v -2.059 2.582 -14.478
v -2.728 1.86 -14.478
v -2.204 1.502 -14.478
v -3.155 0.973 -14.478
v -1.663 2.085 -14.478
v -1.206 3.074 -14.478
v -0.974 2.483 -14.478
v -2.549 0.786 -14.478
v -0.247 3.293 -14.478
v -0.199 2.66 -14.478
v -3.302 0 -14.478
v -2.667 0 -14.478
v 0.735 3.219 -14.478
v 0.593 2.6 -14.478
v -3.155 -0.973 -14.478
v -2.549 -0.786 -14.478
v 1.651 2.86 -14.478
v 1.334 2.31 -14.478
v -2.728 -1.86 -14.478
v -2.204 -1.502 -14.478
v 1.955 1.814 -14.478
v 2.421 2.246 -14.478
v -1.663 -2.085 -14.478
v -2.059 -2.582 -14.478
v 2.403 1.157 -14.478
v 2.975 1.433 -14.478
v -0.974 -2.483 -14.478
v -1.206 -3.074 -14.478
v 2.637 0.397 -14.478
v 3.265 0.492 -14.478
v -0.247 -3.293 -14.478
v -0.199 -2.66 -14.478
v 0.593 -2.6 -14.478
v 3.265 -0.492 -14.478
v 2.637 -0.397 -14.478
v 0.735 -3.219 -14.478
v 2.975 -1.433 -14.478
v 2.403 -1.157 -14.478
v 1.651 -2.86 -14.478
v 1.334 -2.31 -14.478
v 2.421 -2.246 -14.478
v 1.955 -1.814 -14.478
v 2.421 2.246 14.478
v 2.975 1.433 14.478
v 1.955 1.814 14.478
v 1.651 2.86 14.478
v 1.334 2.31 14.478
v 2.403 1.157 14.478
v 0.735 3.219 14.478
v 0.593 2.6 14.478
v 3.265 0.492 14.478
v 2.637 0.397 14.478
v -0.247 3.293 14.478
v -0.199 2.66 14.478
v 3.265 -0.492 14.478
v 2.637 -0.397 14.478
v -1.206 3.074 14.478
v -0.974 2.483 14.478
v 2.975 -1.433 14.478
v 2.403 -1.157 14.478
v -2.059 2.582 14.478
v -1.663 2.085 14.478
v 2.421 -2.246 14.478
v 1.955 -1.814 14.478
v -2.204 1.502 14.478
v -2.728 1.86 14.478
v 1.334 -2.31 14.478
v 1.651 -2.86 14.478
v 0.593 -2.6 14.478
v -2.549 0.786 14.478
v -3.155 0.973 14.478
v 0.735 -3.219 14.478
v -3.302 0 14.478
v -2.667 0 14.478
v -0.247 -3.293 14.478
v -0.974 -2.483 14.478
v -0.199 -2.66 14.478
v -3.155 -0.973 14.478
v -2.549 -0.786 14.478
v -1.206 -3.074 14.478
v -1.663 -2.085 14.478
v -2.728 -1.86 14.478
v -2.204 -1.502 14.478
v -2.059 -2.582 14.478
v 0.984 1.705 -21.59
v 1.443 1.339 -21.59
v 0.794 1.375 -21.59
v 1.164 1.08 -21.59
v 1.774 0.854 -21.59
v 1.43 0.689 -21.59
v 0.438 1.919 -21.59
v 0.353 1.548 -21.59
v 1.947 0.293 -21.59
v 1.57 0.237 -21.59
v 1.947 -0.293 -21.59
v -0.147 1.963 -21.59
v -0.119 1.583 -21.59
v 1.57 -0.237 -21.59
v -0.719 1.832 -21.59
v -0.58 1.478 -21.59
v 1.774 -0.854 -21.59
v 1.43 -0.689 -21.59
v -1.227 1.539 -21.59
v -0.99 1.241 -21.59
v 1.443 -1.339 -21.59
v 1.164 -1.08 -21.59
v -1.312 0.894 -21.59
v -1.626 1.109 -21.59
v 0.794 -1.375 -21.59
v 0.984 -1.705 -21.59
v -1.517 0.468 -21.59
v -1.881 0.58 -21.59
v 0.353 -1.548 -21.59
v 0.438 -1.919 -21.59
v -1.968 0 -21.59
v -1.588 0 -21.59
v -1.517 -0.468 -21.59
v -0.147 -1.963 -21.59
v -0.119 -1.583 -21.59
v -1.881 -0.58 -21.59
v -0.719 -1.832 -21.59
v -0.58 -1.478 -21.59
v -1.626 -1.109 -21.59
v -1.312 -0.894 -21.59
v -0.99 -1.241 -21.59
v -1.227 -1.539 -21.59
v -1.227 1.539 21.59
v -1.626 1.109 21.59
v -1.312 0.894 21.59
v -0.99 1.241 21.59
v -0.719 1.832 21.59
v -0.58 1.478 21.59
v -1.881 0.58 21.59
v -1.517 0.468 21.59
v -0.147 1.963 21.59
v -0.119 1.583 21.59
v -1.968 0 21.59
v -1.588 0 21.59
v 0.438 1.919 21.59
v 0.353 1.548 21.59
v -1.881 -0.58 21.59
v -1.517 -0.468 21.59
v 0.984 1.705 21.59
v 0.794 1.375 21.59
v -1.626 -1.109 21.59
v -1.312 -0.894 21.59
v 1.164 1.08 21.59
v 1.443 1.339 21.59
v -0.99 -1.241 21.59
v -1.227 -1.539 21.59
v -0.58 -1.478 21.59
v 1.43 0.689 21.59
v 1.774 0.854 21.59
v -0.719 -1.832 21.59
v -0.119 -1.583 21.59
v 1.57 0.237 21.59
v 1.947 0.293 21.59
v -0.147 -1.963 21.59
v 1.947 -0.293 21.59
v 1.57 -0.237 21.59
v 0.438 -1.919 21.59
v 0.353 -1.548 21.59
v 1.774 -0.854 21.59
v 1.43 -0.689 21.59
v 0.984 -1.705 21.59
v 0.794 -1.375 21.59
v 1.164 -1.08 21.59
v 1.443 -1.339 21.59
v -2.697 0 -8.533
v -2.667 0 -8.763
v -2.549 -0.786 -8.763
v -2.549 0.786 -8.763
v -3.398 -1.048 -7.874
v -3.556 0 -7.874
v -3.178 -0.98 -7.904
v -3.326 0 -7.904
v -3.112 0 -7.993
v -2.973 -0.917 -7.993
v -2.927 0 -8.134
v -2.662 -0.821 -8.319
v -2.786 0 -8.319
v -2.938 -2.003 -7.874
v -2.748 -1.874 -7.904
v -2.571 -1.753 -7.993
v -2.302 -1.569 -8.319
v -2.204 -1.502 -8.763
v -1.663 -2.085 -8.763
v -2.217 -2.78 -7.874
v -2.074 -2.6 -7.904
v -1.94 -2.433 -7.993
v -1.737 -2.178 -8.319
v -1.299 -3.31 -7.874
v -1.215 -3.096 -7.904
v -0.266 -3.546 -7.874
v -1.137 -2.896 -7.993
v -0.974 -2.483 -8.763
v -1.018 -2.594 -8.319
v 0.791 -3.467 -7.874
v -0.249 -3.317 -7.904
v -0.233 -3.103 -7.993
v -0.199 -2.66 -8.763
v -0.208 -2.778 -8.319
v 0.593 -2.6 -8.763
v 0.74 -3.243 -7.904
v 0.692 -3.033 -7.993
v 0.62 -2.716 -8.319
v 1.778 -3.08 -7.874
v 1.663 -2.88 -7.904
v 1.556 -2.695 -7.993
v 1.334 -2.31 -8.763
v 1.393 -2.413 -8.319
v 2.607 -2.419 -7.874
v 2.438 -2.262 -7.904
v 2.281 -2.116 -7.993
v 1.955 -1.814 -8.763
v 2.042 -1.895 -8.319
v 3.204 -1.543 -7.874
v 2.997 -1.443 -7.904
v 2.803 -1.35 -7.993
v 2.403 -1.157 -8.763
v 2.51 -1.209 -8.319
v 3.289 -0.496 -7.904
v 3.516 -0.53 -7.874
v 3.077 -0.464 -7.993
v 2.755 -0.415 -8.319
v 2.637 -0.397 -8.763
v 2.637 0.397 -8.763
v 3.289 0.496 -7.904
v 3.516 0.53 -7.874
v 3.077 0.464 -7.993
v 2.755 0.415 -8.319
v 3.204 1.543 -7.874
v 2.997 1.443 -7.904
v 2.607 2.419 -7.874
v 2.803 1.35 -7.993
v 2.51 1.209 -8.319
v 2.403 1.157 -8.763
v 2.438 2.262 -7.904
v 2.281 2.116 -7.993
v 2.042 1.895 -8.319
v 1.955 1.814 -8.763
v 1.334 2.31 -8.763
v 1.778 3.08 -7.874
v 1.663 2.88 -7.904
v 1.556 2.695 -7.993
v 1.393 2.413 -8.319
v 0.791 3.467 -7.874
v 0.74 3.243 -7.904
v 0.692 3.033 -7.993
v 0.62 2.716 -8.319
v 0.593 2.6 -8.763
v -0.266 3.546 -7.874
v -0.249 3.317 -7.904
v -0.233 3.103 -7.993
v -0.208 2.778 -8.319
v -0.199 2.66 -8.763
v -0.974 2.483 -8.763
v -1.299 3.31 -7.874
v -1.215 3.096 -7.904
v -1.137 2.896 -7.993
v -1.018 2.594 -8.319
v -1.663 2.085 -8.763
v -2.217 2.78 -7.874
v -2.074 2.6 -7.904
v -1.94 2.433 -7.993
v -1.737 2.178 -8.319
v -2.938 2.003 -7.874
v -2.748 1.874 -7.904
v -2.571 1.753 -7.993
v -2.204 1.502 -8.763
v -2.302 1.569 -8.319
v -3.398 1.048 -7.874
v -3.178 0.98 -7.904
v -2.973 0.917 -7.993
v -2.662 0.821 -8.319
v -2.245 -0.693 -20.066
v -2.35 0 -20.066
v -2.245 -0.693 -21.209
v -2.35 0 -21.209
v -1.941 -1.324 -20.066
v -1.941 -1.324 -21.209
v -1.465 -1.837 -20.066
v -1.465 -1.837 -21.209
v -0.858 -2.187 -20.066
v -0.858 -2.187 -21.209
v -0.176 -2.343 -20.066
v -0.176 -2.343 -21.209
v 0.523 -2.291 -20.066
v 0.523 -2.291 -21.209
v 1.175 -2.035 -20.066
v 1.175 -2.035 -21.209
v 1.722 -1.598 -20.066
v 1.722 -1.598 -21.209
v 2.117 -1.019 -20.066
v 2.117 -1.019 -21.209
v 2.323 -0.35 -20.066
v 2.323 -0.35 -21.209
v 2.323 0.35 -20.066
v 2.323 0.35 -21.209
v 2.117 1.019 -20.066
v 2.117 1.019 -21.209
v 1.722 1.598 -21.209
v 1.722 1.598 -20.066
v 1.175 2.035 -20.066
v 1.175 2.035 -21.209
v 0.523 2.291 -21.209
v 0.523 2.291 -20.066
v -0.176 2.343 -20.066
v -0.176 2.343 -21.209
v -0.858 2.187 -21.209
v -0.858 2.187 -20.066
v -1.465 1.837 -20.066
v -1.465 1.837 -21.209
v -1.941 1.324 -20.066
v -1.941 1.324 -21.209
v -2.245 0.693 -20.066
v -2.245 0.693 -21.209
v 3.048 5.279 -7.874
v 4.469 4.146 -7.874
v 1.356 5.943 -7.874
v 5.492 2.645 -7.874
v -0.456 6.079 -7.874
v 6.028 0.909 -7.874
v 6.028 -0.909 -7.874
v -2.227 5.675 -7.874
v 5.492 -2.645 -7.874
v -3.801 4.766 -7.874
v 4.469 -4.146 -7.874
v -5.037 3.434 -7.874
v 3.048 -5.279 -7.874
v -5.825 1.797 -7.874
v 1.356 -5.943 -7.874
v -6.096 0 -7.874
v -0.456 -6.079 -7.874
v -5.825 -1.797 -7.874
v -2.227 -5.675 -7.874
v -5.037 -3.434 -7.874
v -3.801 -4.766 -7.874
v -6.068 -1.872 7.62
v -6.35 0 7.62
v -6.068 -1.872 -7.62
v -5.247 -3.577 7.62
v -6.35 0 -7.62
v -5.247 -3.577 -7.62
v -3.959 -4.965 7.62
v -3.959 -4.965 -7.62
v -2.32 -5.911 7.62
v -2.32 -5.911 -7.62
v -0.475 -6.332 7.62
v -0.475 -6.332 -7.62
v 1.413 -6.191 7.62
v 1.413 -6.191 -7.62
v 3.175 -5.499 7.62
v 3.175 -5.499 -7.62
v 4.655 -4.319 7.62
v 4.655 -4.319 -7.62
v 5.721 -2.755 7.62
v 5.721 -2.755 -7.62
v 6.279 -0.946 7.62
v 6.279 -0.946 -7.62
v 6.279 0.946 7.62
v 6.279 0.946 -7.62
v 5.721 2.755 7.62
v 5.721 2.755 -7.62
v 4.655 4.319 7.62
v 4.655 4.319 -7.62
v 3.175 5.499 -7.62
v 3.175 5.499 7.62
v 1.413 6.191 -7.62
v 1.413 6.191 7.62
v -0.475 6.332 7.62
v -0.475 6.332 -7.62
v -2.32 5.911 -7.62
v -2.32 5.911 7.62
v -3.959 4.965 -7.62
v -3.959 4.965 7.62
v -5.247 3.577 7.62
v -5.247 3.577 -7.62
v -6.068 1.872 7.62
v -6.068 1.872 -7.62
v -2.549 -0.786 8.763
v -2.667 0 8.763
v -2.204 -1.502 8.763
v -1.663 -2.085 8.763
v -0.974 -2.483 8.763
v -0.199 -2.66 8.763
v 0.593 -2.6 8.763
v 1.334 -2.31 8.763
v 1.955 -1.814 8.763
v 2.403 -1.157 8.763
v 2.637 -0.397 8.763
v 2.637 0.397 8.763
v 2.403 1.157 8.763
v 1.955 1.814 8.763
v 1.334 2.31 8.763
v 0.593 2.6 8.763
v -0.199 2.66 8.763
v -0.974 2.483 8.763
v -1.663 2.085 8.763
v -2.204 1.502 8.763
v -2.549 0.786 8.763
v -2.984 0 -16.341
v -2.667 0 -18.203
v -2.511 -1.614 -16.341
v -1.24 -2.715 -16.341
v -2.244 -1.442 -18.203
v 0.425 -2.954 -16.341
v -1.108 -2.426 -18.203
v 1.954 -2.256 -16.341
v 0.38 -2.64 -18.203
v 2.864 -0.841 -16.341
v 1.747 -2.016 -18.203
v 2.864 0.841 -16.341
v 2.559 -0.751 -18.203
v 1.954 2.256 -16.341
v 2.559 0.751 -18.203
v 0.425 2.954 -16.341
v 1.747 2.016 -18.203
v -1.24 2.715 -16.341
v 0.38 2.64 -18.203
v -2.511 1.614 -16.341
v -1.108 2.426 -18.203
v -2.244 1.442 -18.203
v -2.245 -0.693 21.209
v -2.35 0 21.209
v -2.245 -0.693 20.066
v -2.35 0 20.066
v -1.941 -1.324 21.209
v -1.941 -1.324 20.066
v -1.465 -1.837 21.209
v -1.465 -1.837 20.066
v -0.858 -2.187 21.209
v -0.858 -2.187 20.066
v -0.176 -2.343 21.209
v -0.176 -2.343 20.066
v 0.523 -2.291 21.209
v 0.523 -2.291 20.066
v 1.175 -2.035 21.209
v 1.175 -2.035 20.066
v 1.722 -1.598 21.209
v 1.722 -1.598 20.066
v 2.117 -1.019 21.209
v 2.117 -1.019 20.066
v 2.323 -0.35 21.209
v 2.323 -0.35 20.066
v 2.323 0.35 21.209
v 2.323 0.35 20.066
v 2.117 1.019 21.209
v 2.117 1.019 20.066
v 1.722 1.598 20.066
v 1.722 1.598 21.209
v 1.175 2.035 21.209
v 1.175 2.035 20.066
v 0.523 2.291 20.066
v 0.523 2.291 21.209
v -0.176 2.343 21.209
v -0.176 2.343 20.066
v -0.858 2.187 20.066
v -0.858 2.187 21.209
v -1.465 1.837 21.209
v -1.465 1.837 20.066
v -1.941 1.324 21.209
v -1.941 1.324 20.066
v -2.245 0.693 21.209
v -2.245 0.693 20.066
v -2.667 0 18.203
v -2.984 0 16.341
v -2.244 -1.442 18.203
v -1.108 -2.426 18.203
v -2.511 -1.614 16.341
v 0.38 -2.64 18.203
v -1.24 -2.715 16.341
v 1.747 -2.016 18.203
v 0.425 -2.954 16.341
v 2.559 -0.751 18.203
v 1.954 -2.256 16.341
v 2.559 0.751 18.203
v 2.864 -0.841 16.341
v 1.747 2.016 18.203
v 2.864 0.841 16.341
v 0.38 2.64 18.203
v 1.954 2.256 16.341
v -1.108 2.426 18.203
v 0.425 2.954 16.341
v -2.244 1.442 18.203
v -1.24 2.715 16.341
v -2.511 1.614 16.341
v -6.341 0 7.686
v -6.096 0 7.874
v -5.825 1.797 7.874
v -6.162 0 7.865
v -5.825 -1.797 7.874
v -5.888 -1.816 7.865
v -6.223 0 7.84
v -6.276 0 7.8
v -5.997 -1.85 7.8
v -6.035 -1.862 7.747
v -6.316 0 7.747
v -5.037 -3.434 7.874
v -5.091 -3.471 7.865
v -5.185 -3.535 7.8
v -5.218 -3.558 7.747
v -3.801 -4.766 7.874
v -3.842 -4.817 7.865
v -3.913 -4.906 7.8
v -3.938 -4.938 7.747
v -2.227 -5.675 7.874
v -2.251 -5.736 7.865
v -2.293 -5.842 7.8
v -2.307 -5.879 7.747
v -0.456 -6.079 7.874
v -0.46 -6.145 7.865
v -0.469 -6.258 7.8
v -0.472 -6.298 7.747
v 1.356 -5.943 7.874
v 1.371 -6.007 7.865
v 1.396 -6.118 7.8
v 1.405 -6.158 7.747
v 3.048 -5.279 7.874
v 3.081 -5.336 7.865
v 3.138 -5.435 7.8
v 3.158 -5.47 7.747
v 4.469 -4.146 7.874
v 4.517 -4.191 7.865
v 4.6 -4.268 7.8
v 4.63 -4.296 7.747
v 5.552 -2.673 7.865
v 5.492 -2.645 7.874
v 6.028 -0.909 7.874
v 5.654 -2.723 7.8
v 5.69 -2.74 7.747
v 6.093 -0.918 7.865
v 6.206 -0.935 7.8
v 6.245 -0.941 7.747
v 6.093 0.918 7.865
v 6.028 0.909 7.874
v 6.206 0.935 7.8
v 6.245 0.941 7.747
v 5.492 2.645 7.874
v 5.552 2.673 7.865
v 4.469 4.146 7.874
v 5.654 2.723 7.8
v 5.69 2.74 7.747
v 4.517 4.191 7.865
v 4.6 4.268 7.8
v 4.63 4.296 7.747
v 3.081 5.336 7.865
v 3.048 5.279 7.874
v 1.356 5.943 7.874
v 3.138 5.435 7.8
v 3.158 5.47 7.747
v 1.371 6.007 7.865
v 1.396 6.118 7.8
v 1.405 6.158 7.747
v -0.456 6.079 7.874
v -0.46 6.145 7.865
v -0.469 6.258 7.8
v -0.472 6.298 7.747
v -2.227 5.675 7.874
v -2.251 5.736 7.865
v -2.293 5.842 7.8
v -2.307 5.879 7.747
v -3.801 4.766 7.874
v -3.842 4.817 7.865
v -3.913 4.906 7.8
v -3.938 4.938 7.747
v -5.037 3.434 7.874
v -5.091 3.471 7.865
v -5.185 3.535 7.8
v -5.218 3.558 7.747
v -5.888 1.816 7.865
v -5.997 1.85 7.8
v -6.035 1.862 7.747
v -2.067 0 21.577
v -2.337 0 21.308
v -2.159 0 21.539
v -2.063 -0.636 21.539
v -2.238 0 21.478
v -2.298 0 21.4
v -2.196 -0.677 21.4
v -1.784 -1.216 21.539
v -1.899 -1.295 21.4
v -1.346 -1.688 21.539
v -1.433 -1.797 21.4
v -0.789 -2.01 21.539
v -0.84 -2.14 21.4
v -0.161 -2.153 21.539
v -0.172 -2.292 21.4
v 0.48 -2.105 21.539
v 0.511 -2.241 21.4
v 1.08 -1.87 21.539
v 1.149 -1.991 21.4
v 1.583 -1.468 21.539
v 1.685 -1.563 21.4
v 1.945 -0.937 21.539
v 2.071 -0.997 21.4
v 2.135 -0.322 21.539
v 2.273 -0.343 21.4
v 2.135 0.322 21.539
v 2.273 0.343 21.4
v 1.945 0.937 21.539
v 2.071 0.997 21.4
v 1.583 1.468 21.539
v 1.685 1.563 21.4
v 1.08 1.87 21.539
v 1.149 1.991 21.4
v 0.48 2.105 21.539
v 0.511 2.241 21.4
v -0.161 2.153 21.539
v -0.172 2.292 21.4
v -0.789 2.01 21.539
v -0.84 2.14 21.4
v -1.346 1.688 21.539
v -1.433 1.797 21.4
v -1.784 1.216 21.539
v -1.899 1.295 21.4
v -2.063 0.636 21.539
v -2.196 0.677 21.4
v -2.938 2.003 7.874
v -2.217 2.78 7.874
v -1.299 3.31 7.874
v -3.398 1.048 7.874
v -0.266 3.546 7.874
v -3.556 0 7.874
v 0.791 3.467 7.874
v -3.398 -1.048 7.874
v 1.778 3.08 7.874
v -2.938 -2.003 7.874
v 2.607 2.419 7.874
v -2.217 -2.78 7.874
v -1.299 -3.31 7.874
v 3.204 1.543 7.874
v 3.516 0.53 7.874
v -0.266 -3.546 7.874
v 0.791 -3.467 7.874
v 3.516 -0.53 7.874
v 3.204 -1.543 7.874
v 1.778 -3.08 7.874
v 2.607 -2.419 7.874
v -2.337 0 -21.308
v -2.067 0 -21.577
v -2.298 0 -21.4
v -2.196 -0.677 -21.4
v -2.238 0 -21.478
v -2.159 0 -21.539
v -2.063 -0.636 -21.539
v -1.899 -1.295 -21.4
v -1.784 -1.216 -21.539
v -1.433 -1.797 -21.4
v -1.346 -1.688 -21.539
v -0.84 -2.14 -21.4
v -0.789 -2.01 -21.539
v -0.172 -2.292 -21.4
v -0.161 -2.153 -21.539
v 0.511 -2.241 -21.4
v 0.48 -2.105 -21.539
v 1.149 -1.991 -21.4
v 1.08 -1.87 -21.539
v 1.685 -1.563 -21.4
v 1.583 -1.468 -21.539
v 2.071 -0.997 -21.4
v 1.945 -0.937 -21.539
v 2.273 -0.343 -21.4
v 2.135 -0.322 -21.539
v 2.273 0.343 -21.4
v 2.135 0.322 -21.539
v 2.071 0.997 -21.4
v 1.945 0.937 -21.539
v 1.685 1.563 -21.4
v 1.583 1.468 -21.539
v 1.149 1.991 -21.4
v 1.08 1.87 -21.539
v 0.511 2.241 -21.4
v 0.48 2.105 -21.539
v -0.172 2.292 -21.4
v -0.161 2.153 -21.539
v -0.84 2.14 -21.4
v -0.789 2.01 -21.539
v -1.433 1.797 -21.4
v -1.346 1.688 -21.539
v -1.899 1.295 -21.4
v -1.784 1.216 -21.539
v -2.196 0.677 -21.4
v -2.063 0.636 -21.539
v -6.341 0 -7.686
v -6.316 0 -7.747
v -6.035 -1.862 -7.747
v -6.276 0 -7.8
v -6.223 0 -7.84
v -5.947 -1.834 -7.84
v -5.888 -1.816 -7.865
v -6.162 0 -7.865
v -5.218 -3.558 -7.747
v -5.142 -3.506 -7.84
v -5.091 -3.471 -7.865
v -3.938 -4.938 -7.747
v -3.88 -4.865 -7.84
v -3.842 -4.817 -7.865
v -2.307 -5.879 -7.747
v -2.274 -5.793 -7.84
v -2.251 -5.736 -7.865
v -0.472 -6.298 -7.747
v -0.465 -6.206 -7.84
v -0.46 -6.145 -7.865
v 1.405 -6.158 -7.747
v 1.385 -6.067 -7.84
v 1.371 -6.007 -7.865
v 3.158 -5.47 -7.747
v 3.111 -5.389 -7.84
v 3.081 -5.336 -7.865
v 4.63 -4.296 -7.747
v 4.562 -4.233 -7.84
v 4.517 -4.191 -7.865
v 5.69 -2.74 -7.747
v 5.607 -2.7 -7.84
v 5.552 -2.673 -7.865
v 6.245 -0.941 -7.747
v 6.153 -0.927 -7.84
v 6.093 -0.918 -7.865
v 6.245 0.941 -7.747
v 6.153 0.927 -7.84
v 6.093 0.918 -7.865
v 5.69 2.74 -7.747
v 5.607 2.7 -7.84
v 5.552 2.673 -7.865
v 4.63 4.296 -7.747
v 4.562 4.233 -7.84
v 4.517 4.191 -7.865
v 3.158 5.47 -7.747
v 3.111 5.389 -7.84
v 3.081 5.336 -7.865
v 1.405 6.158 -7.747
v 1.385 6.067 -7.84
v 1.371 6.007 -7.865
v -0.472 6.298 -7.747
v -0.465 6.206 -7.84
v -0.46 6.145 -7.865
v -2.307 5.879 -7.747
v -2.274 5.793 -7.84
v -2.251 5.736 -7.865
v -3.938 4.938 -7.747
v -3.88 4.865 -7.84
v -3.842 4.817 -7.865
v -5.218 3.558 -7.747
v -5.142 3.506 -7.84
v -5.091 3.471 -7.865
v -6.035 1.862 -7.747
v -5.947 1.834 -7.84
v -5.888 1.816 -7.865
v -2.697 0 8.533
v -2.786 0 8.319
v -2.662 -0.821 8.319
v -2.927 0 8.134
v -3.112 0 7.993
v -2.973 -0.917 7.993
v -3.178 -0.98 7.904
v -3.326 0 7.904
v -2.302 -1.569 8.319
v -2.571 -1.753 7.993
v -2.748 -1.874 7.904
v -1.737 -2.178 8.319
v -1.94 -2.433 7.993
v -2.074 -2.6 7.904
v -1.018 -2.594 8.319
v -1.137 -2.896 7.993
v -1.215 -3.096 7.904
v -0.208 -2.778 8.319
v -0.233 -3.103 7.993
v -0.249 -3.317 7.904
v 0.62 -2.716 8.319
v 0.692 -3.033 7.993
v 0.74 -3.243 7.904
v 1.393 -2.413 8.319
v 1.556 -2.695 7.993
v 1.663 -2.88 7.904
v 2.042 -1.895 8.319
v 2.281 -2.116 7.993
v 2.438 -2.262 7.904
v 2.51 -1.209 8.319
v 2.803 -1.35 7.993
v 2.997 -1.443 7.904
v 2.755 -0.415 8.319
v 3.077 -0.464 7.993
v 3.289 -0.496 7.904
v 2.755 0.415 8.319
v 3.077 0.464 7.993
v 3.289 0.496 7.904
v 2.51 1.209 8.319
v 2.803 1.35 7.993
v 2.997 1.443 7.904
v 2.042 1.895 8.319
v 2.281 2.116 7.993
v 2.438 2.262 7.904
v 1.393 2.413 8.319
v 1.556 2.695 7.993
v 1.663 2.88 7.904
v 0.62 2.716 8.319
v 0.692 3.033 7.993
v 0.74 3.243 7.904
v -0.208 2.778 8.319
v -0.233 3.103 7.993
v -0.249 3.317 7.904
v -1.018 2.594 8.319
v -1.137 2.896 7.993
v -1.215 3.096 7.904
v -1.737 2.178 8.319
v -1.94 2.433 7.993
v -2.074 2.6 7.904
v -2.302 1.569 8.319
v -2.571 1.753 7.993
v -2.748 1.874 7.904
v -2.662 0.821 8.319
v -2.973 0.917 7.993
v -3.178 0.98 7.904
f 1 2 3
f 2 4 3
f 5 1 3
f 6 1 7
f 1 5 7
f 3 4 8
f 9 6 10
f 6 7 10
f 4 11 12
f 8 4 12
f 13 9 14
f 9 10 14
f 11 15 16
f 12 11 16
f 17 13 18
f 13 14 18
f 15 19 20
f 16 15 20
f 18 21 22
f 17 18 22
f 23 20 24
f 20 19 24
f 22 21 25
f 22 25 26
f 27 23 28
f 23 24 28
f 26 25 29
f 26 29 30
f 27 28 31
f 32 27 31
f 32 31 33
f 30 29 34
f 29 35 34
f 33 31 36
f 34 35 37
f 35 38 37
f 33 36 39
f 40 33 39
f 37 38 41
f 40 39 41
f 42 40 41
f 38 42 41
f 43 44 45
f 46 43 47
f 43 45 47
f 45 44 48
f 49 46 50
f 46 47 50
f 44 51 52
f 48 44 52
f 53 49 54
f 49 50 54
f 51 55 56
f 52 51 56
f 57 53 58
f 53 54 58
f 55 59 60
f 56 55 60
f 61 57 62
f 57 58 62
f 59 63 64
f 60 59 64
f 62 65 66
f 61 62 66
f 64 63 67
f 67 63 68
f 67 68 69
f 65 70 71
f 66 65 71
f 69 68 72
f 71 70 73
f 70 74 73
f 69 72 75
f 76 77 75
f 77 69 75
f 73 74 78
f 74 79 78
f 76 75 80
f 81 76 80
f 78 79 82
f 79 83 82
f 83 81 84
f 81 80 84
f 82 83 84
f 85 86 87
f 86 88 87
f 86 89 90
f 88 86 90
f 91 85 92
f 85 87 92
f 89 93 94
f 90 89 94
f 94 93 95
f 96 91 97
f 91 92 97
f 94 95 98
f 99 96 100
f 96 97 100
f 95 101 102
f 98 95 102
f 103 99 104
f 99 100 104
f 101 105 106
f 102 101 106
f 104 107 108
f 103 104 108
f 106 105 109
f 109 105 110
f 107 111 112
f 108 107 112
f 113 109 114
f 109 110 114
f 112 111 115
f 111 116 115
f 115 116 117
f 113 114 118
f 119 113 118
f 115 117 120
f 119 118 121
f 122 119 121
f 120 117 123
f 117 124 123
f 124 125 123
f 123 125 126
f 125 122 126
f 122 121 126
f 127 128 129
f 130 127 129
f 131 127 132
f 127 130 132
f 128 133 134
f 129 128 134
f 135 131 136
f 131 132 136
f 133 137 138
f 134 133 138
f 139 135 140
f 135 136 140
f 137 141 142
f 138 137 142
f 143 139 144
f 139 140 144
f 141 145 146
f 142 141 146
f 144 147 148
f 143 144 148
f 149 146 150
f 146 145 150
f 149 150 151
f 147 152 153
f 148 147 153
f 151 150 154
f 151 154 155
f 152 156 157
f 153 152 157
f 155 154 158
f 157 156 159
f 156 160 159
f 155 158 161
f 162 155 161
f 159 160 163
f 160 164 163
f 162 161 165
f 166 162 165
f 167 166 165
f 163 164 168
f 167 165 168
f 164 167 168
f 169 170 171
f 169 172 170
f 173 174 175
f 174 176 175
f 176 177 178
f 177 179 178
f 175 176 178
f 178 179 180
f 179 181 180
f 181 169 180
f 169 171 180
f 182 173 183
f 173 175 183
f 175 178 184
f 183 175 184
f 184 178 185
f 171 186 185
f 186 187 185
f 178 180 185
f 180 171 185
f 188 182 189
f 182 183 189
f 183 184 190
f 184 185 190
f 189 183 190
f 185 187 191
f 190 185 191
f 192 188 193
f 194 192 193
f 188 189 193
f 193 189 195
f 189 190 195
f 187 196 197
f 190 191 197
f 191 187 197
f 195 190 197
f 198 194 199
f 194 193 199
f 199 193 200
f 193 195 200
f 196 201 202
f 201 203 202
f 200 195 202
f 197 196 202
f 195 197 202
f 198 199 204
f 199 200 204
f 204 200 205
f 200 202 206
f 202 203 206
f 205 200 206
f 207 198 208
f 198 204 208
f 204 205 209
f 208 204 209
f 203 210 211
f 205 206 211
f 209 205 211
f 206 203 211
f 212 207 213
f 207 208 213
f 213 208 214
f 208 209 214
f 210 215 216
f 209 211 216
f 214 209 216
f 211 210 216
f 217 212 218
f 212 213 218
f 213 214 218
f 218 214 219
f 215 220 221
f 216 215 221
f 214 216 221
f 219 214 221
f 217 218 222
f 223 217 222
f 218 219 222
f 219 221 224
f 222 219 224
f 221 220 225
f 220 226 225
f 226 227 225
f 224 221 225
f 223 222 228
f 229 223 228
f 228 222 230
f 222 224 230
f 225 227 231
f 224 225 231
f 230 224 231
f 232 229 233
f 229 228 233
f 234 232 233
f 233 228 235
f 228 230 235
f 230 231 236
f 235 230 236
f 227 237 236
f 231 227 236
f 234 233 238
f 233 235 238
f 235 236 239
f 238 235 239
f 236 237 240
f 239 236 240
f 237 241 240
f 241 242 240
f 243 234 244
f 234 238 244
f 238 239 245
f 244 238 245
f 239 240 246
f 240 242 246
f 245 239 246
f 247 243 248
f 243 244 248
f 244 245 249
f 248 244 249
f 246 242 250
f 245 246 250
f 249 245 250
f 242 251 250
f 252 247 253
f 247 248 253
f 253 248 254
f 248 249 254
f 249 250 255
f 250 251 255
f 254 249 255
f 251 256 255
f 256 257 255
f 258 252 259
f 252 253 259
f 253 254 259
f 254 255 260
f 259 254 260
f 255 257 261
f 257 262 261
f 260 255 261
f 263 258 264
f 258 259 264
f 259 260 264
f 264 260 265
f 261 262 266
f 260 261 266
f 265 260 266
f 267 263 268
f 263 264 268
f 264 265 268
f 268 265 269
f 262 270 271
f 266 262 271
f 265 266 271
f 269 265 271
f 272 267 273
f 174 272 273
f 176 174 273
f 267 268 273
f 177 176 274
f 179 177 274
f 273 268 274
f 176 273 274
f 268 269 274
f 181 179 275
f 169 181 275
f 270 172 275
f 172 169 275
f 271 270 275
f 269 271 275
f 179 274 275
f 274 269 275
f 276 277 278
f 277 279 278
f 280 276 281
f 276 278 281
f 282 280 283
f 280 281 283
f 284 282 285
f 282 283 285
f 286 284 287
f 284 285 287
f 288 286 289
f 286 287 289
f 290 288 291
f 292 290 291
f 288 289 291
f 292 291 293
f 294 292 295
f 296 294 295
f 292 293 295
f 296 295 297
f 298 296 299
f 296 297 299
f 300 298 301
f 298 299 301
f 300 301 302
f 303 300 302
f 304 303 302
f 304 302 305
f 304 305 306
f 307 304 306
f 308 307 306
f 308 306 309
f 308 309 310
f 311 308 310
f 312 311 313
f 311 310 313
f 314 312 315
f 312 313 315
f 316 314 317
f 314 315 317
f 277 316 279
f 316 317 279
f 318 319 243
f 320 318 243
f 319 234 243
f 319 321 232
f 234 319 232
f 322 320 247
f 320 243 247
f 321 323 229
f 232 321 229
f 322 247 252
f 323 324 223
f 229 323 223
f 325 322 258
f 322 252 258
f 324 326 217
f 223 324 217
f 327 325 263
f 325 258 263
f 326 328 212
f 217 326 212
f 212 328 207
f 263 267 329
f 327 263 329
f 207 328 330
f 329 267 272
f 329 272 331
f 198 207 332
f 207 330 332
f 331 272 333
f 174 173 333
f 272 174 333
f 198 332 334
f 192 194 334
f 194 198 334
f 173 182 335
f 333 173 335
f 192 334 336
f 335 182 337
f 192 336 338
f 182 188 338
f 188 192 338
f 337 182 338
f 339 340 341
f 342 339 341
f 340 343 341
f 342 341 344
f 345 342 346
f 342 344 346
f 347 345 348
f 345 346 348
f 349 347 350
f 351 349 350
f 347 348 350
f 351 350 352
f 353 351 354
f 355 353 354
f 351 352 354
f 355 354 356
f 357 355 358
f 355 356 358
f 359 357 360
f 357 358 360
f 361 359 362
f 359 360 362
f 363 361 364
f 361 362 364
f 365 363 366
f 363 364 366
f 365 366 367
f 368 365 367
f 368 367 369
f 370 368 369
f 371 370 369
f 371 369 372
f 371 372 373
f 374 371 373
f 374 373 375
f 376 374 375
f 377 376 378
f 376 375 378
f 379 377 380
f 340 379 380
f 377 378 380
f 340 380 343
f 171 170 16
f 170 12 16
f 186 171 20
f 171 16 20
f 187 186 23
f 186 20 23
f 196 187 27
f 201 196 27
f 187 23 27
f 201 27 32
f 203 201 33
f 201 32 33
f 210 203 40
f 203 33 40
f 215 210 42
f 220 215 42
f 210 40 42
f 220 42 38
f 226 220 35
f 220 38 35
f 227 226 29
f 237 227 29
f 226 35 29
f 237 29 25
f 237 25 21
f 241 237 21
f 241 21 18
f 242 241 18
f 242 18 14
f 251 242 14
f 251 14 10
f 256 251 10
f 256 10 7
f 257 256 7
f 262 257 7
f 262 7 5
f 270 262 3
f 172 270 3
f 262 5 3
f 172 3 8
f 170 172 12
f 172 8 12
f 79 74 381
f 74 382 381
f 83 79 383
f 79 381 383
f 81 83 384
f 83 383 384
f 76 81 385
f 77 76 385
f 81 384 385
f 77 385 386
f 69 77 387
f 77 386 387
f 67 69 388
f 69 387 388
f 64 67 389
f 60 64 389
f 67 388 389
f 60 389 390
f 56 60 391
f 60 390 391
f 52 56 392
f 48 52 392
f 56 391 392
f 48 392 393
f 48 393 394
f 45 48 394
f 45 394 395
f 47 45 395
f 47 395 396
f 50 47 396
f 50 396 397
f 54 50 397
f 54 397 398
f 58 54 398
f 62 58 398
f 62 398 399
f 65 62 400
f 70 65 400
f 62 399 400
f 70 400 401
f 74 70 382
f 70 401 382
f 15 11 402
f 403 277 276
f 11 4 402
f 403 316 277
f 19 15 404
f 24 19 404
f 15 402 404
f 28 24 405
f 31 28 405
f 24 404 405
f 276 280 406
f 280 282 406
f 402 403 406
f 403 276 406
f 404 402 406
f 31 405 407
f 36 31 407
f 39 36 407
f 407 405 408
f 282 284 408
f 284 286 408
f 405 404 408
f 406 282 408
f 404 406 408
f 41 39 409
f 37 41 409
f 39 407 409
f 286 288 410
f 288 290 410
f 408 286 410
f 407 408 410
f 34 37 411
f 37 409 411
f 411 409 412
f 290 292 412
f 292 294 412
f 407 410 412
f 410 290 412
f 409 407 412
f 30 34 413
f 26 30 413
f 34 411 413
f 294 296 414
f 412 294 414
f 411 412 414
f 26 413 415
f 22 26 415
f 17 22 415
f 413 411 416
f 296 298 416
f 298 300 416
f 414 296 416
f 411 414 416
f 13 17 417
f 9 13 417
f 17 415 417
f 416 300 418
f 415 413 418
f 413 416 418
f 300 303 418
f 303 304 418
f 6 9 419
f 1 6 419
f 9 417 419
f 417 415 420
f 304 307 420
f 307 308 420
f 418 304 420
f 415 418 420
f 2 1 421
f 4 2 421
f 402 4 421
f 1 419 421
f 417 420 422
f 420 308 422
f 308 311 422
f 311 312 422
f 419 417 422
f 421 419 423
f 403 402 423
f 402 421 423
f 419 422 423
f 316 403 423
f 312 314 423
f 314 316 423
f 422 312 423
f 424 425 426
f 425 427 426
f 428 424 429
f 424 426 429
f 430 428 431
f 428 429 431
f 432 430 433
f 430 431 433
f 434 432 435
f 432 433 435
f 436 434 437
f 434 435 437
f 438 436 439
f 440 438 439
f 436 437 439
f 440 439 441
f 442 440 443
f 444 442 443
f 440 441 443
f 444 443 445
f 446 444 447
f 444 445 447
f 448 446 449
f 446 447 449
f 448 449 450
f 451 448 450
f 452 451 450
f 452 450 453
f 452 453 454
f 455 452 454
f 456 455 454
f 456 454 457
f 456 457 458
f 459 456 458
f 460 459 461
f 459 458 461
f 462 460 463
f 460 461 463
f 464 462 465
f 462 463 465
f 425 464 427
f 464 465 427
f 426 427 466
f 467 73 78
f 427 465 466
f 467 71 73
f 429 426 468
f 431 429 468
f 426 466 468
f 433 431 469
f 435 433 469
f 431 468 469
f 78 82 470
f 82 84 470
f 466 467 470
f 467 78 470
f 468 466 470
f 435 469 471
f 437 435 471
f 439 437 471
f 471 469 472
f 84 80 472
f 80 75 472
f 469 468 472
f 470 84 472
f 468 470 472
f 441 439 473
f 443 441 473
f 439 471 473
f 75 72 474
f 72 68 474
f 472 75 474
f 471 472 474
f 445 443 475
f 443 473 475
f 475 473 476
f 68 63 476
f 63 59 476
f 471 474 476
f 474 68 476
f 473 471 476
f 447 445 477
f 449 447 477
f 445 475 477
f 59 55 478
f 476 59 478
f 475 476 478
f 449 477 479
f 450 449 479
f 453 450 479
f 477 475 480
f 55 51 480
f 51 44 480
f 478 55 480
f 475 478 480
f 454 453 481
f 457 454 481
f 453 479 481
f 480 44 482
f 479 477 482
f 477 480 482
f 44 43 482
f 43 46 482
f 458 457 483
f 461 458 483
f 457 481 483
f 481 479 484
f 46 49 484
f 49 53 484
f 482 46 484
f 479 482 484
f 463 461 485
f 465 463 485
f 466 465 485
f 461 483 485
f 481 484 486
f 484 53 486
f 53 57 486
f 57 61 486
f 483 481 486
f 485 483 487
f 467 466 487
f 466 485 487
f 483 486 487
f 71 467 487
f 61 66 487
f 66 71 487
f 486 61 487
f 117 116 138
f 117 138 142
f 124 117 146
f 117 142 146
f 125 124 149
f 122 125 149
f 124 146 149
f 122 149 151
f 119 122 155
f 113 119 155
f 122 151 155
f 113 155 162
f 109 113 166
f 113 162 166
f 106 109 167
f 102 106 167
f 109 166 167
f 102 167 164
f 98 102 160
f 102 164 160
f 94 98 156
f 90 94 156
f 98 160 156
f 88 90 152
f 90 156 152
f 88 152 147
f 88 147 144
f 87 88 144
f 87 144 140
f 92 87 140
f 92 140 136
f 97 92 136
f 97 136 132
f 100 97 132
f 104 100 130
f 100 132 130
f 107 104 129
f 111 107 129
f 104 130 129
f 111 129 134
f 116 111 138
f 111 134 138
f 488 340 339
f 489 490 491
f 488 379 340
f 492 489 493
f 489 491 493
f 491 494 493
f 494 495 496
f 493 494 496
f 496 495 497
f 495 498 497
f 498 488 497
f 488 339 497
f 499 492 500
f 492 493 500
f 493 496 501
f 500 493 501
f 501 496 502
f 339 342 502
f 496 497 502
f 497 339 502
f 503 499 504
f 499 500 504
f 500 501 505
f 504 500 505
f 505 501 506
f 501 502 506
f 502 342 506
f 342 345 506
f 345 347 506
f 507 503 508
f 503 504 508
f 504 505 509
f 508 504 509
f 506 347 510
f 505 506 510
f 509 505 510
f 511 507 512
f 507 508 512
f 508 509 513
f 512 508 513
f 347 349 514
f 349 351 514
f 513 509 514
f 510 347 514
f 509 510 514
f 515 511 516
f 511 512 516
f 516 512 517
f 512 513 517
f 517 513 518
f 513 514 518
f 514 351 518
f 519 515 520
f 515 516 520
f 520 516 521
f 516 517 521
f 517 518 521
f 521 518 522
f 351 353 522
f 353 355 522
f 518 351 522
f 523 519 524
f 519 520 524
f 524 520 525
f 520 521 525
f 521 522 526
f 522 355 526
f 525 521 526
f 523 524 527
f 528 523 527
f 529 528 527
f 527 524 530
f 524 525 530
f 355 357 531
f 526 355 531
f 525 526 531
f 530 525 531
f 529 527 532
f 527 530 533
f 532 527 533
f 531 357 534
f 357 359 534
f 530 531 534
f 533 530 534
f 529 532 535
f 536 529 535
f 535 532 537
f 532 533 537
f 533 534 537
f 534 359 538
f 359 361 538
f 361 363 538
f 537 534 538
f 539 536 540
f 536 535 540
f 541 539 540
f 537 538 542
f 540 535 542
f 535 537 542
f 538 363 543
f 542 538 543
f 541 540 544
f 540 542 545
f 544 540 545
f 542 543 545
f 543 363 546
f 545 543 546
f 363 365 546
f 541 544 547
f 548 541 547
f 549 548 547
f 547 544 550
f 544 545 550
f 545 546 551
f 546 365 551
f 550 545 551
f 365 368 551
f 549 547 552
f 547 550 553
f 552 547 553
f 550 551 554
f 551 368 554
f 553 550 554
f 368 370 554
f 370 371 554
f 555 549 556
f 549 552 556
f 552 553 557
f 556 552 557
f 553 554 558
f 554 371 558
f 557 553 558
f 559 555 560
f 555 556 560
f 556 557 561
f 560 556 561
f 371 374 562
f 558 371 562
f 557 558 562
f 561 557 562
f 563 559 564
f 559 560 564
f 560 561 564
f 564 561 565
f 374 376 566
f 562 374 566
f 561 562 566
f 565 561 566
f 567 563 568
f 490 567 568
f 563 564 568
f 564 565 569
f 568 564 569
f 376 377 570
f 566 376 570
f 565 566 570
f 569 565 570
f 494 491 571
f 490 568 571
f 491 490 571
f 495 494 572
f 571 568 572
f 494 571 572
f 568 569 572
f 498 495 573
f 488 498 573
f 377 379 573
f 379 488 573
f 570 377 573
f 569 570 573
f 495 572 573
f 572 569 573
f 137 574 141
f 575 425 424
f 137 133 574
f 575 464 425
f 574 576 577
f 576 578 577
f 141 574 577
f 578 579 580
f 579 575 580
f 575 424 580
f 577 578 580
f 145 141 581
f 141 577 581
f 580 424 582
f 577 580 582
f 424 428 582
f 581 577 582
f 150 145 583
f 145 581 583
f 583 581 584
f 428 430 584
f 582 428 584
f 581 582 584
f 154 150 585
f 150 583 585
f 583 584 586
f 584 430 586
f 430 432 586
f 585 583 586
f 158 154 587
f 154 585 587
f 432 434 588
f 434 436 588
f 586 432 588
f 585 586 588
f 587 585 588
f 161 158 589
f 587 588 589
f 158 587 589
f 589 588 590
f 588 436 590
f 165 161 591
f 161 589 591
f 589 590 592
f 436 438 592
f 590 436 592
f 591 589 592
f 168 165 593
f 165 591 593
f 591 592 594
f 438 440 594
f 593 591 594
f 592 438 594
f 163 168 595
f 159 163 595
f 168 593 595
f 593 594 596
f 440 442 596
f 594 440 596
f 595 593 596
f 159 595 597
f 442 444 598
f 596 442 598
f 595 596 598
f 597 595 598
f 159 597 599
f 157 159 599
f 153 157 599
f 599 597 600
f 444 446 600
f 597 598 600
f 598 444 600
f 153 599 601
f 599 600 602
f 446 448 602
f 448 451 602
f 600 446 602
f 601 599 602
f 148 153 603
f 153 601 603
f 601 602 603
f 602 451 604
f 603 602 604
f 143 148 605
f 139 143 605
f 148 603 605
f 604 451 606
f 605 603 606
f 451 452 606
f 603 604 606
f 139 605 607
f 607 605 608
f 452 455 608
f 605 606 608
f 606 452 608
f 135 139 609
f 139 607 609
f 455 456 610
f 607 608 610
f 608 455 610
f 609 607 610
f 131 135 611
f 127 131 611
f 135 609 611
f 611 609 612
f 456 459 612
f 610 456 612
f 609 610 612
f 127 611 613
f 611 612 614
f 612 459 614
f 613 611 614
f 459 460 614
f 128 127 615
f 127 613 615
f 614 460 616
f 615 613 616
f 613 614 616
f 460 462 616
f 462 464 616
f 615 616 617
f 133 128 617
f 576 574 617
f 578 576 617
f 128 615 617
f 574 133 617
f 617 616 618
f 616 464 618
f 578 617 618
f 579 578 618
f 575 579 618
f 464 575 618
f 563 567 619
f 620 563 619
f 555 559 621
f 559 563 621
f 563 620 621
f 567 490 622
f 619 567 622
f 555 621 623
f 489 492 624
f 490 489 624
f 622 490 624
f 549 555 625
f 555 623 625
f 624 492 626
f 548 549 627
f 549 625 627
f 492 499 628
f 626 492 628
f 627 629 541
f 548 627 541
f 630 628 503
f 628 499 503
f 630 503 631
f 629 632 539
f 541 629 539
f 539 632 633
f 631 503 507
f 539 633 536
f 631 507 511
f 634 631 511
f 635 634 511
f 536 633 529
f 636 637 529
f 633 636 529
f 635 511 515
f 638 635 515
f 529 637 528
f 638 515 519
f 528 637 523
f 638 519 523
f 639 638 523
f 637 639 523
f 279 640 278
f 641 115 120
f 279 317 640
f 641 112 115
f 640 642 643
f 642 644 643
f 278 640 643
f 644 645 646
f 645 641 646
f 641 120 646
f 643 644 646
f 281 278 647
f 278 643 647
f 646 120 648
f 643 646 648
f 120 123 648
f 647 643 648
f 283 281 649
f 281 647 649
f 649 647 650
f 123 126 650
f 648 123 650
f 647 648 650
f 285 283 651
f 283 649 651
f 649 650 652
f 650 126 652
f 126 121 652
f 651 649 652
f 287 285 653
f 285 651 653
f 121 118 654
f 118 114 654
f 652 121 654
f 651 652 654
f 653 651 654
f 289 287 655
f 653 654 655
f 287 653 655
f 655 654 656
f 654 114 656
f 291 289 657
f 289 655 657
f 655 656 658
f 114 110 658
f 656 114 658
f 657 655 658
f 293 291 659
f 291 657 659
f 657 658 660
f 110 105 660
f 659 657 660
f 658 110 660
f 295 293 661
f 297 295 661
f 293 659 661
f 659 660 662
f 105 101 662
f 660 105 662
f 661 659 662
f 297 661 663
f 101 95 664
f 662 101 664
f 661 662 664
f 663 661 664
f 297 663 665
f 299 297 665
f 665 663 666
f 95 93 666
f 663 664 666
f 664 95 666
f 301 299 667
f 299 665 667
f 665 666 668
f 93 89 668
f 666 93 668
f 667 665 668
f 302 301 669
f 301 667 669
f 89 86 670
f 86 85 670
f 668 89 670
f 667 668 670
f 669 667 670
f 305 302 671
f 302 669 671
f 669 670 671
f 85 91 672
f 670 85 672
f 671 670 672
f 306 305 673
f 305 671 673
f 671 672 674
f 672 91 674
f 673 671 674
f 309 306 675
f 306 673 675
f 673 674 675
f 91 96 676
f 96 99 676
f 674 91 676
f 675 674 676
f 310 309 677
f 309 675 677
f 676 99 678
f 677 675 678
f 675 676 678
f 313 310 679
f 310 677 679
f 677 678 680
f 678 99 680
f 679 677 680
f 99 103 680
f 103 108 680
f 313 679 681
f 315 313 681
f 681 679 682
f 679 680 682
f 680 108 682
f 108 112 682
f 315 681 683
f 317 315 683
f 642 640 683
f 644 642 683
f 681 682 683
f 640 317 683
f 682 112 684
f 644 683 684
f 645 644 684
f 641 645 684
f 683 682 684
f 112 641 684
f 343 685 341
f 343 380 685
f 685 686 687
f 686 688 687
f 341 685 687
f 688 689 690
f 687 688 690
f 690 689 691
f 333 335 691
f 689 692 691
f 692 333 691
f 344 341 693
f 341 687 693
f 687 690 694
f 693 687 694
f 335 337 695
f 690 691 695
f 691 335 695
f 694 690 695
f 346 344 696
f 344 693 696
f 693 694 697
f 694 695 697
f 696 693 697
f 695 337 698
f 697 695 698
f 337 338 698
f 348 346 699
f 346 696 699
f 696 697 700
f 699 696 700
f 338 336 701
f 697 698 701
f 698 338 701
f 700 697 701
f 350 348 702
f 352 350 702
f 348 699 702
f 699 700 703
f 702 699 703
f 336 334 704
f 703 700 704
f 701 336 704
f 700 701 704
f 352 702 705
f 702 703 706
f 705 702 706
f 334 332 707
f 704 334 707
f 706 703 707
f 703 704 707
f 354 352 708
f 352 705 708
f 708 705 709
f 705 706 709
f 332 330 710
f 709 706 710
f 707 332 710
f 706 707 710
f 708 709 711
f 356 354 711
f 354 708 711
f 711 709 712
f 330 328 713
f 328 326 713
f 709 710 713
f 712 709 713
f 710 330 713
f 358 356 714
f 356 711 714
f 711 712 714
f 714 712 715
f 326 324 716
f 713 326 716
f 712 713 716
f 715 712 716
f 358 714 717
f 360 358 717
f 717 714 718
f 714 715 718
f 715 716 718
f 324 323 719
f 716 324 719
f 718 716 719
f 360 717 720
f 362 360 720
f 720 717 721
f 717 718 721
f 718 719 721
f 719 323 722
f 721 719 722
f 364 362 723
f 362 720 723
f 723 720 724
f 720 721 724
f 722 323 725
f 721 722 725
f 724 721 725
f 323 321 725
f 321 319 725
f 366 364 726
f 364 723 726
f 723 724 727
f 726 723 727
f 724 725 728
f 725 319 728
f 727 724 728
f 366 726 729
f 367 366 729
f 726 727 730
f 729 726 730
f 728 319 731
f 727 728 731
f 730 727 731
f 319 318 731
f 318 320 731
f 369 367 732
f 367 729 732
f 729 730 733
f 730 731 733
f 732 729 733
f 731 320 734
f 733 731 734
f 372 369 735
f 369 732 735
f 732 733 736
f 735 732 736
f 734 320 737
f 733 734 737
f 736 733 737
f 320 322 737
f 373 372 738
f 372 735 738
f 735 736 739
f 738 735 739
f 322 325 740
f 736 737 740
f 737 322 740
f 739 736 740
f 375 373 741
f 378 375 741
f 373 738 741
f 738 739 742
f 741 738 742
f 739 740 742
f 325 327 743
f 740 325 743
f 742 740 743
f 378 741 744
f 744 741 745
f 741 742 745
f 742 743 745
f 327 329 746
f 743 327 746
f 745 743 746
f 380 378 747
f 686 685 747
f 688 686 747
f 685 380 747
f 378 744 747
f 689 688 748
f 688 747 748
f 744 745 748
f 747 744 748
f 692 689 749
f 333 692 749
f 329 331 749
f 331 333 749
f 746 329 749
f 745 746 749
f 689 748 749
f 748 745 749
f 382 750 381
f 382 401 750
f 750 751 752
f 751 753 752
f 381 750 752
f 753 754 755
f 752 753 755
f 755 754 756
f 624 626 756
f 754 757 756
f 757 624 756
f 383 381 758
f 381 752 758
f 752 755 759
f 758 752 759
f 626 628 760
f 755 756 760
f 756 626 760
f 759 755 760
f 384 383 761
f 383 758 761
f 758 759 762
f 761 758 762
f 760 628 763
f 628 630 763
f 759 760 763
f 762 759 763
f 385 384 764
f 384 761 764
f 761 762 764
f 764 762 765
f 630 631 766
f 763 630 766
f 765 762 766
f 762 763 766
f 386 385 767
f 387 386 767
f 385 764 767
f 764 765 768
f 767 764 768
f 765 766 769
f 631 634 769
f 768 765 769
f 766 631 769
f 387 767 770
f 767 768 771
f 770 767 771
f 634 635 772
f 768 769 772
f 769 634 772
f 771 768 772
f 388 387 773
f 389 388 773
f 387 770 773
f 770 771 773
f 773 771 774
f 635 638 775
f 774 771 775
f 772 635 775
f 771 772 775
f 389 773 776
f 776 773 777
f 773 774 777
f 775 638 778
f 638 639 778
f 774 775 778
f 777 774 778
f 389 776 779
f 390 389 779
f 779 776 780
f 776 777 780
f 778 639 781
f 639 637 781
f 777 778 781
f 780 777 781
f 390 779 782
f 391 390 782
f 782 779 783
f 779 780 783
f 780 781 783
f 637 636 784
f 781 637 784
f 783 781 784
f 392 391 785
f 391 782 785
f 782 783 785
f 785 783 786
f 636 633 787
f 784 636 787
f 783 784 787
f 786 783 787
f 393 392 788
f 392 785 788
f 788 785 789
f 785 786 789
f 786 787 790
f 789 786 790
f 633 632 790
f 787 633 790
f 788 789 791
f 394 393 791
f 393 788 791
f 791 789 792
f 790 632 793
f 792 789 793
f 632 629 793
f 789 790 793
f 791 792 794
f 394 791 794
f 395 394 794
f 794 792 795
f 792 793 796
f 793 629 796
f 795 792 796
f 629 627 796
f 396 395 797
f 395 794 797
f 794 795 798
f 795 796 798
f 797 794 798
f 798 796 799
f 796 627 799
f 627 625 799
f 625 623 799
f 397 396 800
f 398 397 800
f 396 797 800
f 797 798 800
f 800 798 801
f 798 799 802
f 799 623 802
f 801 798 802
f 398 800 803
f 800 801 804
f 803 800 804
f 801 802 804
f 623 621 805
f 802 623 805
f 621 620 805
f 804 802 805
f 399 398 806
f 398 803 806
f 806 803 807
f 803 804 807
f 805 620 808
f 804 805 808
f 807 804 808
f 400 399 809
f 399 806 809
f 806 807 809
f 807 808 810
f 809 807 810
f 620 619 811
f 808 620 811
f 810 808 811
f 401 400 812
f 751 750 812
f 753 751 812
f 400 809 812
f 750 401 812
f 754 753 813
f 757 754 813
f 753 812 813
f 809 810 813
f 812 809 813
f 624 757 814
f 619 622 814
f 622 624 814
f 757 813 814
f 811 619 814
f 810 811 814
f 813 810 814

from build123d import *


with BuildPart() as part:
    # Sketch2 → Revolve1 (revolve)
    with BuildSketch(Plane(origin=(0, 0, 0), x_dir=(0, 0, -1), z_dir=(1, 0, 0))):
        with BuildLine():
            Line((-21.59, 1.5875), (-21.59, 1.9685))
            ThreePointArc((-21.59, 1.9685), (-21.478407684, 2.237907684), (-21.209, 2.3495))
            Line((-21.209, 2.3495), (-20.066, 2.3495))
            Line((-20.066, 2.3495), (-14.478, 3.302))
            Line((-14.478, 3.302), (-14.478, 2.667))
            Line((-14.478, 2.667), (-8.763, 2.667))
            ThreePointArc((-8.763, 2.667), (-8.134382072, 2.927382072), (-7.874, 3.556))
            Line((-7.874, 3.556), (-7.874, 6.096))
            ThreePointArc((-7.874, 6.096), (-7.799605122, 6.275605122), (-7.62, 6.35))
            Line((-7.62, 6.35), (7.62, 6.35))
            ThreePointArc((7.62, 6.35), (7.799605122, 6.275605122), (7.874, 6.096))
            Line((7.874, 6.096), (7.874, 3.556))
            ThreePointArc((7.874, 3.556), (8.134382072, 2.927382072), (8.763, 2.667))
            Line((8.763, 2.667), (14.478, 2.667))
            Line((14.478, 2.667), (14.478, 3.302))
            Line((14.478, 3.302), (20.066, 2.3495))
            Line((20.066, 2.3495), (21.209, 2.3495))
            ThreePointArc((21.209, 2.3495), (21.478407684, 2.237907684), (21.59, 1.9685))
            Line((21.59, 1.9685), (21.59, 1.5875))
            Line((21.59, 1.5875), (-21.59, 1.5875))
        make_face()
    revolve(axis=Axis((0, 0, -21.59), (0, 0, 1)))


solid = part.part
